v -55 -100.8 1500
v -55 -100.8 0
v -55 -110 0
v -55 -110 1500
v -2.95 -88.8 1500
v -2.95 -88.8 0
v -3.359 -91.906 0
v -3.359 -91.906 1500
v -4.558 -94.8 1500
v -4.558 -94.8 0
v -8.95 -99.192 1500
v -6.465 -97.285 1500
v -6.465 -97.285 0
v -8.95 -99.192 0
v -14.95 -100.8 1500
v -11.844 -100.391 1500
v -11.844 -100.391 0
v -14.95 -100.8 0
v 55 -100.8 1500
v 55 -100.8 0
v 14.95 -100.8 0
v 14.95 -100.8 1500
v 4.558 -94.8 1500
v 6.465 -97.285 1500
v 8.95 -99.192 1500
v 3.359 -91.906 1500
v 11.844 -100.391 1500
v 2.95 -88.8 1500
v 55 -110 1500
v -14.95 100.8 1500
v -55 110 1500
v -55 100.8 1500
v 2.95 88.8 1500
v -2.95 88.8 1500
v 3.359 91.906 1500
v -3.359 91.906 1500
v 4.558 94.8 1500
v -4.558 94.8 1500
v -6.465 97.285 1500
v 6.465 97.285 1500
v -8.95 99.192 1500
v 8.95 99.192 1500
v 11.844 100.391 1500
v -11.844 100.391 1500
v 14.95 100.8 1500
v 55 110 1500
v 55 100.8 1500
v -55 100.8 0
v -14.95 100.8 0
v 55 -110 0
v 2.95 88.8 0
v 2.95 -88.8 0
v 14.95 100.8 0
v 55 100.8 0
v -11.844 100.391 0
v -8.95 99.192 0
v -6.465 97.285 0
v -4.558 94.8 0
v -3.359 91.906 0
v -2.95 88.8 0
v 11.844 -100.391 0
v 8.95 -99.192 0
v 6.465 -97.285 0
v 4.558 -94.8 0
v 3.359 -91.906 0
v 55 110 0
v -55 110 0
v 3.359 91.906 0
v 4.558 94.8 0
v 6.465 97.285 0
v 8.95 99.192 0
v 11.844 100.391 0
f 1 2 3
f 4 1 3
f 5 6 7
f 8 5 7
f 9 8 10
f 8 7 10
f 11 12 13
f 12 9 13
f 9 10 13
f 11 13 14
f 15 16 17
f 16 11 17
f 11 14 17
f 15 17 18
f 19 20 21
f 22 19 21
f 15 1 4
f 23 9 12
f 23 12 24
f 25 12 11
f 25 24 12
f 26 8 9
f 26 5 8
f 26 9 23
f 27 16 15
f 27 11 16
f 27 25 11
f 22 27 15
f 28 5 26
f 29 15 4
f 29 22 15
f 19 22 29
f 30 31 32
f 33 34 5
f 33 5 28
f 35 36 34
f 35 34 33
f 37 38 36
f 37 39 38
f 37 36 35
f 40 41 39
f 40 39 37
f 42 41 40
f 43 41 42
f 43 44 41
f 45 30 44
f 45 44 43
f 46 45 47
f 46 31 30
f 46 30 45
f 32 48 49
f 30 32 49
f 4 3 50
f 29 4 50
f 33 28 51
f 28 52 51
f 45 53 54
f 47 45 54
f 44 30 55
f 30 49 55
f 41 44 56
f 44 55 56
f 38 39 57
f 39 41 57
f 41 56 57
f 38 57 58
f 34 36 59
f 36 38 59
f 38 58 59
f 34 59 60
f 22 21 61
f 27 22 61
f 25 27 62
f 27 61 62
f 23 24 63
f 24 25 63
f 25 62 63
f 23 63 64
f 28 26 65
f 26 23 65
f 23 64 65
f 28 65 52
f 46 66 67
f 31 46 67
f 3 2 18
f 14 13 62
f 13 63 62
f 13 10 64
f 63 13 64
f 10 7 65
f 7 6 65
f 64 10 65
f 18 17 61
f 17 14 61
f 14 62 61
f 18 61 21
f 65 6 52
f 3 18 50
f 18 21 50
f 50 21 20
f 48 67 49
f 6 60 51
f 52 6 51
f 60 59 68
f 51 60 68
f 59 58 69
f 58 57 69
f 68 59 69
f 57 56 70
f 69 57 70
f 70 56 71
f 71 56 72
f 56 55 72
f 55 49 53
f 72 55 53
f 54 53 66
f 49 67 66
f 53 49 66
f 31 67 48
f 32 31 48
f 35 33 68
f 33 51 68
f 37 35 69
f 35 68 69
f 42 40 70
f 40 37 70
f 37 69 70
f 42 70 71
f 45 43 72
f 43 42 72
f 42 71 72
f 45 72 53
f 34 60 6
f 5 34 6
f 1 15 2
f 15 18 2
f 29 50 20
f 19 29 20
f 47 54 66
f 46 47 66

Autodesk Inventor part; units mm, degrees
ref_plane "YZ Plane" through (0, 0, 0) normal (1, 0, 0) x (0, 1, 0)
ref_plane "Start plane" through (0, 0, 0) normal (0, 0, 1) x (1, 0, 0)
ref_plane "End plane" through (0, 0, 1500) normal (0, 0, 1) x (1, 0, 0)
sketch "Sketch2" plane through (0, 0, 0) normal (0, 0, 1) x (1, 0, 0)
  line L0 (-55, 100.8) -> (-14.95, 100.8)
  line L1 (-55, 110) -> (-55, 100.8)
  line L2 (55, 110) -> (-55, 110)
  line L3 (55, 100.8) -> (55, 110)
  line L4 (14.95, 100.8) -> (55, 100.8)
  line L5 (2.95, -88.8) -> (2.95, 88.8)
  line L6 (55, -100.8) -> (14.95, -100.8)
  line L7 (55, -110) -> (55, -100.8)
  line L8 (-55, -100.8) -> (-55, -110)
  line L9 (-14.95, -100.8) -> (-55, -100.8)
  line L10 (-2.95, 88.8) -> (-2.95, -88.8)
  line L11 (0, -252) -> (0, 252) construction
  line L12 (-2.95, -100.8) -> (2.95, -100.8) construction
  arc A0 (-14.95, -100.8) -> (-2.95, -88.8) centre (-14.95, -88.8) ccw
  arc A1 (-2.95, 88.8) -> (-14.95, 100.8) centre (-14.95, 88.8) ccw
  arc A2 (14.95, 100.8) -> (2.95, 88.8) centre (14.95, 88.8) ccw
  arc A3 (2.95, -88.8) -> (14.95, -100.8) centre (14.95, -88.8) ccw
  line L13 (-119, 0) -> (119, 0) construction
  line L14 (-55, -110) -> (55, -110)
  point P0 (-2.95, 100.8)
  point P1 (2.95, 100.8)
  point P2 (0, 0)
  point P3 (0, -100.8)
  point P4 (0, 0)
  dimension "d1" = 220
  dimension "d3" = 9.2
  dimension "d5" = 5.9
  dimension "d7" = 110
  dimension "d13" = 12
  dimension "d14" = 110
  dimension "d15" = 55
extrude "Body" add sketch "Sketch2" along normal up to surface (1500 mm away) from surface at 0
sketch "Sketch3" plane through (0, 0, 0) normal (0, 0, 1) x (1, 0, 0)
  line L0 (0, 0) -> (10, 0)
ref_plane "Work Plane3" through (0, 0, 0) normal (0, -1, 0) x (1, 0, 0)
sketch "Sketch4" plane through (0, 0, 0) normal (0, -1, 0) x (1, 0, 0)
  line L0 (-2, 0) -> (12, 0) projected
  line L1 (-2, 1500) -> (12, 1500) projected
  dimension "d19" = 1500
equation "\"d1\" = ParH"
equation "\"d3\" = t2"
equation "\"d5\" = t1"
equation "\"d7\" = b"
equation "\"d13\" = R1"
equation "\"d14\" = 0.5 * d1"
equation "\"d15\" = 0.5 * d7"
equation "\"d8\" = G_L"
equation "\"b\" = 110"
equation "\"ParH\" = 220"
equation "\"R1\" = 12"
equation "\"G_L\" = d19"
equation "\"t1\" = 5.9"
equation "\"t2\" = 9.2"
equation "\"G_OFFSET_START\" = 0"
equation "\"G_OFFSET_END\" = 0"
properties part number "DIN 1025 - IPE 220-1500" material "Steel, Mild"
